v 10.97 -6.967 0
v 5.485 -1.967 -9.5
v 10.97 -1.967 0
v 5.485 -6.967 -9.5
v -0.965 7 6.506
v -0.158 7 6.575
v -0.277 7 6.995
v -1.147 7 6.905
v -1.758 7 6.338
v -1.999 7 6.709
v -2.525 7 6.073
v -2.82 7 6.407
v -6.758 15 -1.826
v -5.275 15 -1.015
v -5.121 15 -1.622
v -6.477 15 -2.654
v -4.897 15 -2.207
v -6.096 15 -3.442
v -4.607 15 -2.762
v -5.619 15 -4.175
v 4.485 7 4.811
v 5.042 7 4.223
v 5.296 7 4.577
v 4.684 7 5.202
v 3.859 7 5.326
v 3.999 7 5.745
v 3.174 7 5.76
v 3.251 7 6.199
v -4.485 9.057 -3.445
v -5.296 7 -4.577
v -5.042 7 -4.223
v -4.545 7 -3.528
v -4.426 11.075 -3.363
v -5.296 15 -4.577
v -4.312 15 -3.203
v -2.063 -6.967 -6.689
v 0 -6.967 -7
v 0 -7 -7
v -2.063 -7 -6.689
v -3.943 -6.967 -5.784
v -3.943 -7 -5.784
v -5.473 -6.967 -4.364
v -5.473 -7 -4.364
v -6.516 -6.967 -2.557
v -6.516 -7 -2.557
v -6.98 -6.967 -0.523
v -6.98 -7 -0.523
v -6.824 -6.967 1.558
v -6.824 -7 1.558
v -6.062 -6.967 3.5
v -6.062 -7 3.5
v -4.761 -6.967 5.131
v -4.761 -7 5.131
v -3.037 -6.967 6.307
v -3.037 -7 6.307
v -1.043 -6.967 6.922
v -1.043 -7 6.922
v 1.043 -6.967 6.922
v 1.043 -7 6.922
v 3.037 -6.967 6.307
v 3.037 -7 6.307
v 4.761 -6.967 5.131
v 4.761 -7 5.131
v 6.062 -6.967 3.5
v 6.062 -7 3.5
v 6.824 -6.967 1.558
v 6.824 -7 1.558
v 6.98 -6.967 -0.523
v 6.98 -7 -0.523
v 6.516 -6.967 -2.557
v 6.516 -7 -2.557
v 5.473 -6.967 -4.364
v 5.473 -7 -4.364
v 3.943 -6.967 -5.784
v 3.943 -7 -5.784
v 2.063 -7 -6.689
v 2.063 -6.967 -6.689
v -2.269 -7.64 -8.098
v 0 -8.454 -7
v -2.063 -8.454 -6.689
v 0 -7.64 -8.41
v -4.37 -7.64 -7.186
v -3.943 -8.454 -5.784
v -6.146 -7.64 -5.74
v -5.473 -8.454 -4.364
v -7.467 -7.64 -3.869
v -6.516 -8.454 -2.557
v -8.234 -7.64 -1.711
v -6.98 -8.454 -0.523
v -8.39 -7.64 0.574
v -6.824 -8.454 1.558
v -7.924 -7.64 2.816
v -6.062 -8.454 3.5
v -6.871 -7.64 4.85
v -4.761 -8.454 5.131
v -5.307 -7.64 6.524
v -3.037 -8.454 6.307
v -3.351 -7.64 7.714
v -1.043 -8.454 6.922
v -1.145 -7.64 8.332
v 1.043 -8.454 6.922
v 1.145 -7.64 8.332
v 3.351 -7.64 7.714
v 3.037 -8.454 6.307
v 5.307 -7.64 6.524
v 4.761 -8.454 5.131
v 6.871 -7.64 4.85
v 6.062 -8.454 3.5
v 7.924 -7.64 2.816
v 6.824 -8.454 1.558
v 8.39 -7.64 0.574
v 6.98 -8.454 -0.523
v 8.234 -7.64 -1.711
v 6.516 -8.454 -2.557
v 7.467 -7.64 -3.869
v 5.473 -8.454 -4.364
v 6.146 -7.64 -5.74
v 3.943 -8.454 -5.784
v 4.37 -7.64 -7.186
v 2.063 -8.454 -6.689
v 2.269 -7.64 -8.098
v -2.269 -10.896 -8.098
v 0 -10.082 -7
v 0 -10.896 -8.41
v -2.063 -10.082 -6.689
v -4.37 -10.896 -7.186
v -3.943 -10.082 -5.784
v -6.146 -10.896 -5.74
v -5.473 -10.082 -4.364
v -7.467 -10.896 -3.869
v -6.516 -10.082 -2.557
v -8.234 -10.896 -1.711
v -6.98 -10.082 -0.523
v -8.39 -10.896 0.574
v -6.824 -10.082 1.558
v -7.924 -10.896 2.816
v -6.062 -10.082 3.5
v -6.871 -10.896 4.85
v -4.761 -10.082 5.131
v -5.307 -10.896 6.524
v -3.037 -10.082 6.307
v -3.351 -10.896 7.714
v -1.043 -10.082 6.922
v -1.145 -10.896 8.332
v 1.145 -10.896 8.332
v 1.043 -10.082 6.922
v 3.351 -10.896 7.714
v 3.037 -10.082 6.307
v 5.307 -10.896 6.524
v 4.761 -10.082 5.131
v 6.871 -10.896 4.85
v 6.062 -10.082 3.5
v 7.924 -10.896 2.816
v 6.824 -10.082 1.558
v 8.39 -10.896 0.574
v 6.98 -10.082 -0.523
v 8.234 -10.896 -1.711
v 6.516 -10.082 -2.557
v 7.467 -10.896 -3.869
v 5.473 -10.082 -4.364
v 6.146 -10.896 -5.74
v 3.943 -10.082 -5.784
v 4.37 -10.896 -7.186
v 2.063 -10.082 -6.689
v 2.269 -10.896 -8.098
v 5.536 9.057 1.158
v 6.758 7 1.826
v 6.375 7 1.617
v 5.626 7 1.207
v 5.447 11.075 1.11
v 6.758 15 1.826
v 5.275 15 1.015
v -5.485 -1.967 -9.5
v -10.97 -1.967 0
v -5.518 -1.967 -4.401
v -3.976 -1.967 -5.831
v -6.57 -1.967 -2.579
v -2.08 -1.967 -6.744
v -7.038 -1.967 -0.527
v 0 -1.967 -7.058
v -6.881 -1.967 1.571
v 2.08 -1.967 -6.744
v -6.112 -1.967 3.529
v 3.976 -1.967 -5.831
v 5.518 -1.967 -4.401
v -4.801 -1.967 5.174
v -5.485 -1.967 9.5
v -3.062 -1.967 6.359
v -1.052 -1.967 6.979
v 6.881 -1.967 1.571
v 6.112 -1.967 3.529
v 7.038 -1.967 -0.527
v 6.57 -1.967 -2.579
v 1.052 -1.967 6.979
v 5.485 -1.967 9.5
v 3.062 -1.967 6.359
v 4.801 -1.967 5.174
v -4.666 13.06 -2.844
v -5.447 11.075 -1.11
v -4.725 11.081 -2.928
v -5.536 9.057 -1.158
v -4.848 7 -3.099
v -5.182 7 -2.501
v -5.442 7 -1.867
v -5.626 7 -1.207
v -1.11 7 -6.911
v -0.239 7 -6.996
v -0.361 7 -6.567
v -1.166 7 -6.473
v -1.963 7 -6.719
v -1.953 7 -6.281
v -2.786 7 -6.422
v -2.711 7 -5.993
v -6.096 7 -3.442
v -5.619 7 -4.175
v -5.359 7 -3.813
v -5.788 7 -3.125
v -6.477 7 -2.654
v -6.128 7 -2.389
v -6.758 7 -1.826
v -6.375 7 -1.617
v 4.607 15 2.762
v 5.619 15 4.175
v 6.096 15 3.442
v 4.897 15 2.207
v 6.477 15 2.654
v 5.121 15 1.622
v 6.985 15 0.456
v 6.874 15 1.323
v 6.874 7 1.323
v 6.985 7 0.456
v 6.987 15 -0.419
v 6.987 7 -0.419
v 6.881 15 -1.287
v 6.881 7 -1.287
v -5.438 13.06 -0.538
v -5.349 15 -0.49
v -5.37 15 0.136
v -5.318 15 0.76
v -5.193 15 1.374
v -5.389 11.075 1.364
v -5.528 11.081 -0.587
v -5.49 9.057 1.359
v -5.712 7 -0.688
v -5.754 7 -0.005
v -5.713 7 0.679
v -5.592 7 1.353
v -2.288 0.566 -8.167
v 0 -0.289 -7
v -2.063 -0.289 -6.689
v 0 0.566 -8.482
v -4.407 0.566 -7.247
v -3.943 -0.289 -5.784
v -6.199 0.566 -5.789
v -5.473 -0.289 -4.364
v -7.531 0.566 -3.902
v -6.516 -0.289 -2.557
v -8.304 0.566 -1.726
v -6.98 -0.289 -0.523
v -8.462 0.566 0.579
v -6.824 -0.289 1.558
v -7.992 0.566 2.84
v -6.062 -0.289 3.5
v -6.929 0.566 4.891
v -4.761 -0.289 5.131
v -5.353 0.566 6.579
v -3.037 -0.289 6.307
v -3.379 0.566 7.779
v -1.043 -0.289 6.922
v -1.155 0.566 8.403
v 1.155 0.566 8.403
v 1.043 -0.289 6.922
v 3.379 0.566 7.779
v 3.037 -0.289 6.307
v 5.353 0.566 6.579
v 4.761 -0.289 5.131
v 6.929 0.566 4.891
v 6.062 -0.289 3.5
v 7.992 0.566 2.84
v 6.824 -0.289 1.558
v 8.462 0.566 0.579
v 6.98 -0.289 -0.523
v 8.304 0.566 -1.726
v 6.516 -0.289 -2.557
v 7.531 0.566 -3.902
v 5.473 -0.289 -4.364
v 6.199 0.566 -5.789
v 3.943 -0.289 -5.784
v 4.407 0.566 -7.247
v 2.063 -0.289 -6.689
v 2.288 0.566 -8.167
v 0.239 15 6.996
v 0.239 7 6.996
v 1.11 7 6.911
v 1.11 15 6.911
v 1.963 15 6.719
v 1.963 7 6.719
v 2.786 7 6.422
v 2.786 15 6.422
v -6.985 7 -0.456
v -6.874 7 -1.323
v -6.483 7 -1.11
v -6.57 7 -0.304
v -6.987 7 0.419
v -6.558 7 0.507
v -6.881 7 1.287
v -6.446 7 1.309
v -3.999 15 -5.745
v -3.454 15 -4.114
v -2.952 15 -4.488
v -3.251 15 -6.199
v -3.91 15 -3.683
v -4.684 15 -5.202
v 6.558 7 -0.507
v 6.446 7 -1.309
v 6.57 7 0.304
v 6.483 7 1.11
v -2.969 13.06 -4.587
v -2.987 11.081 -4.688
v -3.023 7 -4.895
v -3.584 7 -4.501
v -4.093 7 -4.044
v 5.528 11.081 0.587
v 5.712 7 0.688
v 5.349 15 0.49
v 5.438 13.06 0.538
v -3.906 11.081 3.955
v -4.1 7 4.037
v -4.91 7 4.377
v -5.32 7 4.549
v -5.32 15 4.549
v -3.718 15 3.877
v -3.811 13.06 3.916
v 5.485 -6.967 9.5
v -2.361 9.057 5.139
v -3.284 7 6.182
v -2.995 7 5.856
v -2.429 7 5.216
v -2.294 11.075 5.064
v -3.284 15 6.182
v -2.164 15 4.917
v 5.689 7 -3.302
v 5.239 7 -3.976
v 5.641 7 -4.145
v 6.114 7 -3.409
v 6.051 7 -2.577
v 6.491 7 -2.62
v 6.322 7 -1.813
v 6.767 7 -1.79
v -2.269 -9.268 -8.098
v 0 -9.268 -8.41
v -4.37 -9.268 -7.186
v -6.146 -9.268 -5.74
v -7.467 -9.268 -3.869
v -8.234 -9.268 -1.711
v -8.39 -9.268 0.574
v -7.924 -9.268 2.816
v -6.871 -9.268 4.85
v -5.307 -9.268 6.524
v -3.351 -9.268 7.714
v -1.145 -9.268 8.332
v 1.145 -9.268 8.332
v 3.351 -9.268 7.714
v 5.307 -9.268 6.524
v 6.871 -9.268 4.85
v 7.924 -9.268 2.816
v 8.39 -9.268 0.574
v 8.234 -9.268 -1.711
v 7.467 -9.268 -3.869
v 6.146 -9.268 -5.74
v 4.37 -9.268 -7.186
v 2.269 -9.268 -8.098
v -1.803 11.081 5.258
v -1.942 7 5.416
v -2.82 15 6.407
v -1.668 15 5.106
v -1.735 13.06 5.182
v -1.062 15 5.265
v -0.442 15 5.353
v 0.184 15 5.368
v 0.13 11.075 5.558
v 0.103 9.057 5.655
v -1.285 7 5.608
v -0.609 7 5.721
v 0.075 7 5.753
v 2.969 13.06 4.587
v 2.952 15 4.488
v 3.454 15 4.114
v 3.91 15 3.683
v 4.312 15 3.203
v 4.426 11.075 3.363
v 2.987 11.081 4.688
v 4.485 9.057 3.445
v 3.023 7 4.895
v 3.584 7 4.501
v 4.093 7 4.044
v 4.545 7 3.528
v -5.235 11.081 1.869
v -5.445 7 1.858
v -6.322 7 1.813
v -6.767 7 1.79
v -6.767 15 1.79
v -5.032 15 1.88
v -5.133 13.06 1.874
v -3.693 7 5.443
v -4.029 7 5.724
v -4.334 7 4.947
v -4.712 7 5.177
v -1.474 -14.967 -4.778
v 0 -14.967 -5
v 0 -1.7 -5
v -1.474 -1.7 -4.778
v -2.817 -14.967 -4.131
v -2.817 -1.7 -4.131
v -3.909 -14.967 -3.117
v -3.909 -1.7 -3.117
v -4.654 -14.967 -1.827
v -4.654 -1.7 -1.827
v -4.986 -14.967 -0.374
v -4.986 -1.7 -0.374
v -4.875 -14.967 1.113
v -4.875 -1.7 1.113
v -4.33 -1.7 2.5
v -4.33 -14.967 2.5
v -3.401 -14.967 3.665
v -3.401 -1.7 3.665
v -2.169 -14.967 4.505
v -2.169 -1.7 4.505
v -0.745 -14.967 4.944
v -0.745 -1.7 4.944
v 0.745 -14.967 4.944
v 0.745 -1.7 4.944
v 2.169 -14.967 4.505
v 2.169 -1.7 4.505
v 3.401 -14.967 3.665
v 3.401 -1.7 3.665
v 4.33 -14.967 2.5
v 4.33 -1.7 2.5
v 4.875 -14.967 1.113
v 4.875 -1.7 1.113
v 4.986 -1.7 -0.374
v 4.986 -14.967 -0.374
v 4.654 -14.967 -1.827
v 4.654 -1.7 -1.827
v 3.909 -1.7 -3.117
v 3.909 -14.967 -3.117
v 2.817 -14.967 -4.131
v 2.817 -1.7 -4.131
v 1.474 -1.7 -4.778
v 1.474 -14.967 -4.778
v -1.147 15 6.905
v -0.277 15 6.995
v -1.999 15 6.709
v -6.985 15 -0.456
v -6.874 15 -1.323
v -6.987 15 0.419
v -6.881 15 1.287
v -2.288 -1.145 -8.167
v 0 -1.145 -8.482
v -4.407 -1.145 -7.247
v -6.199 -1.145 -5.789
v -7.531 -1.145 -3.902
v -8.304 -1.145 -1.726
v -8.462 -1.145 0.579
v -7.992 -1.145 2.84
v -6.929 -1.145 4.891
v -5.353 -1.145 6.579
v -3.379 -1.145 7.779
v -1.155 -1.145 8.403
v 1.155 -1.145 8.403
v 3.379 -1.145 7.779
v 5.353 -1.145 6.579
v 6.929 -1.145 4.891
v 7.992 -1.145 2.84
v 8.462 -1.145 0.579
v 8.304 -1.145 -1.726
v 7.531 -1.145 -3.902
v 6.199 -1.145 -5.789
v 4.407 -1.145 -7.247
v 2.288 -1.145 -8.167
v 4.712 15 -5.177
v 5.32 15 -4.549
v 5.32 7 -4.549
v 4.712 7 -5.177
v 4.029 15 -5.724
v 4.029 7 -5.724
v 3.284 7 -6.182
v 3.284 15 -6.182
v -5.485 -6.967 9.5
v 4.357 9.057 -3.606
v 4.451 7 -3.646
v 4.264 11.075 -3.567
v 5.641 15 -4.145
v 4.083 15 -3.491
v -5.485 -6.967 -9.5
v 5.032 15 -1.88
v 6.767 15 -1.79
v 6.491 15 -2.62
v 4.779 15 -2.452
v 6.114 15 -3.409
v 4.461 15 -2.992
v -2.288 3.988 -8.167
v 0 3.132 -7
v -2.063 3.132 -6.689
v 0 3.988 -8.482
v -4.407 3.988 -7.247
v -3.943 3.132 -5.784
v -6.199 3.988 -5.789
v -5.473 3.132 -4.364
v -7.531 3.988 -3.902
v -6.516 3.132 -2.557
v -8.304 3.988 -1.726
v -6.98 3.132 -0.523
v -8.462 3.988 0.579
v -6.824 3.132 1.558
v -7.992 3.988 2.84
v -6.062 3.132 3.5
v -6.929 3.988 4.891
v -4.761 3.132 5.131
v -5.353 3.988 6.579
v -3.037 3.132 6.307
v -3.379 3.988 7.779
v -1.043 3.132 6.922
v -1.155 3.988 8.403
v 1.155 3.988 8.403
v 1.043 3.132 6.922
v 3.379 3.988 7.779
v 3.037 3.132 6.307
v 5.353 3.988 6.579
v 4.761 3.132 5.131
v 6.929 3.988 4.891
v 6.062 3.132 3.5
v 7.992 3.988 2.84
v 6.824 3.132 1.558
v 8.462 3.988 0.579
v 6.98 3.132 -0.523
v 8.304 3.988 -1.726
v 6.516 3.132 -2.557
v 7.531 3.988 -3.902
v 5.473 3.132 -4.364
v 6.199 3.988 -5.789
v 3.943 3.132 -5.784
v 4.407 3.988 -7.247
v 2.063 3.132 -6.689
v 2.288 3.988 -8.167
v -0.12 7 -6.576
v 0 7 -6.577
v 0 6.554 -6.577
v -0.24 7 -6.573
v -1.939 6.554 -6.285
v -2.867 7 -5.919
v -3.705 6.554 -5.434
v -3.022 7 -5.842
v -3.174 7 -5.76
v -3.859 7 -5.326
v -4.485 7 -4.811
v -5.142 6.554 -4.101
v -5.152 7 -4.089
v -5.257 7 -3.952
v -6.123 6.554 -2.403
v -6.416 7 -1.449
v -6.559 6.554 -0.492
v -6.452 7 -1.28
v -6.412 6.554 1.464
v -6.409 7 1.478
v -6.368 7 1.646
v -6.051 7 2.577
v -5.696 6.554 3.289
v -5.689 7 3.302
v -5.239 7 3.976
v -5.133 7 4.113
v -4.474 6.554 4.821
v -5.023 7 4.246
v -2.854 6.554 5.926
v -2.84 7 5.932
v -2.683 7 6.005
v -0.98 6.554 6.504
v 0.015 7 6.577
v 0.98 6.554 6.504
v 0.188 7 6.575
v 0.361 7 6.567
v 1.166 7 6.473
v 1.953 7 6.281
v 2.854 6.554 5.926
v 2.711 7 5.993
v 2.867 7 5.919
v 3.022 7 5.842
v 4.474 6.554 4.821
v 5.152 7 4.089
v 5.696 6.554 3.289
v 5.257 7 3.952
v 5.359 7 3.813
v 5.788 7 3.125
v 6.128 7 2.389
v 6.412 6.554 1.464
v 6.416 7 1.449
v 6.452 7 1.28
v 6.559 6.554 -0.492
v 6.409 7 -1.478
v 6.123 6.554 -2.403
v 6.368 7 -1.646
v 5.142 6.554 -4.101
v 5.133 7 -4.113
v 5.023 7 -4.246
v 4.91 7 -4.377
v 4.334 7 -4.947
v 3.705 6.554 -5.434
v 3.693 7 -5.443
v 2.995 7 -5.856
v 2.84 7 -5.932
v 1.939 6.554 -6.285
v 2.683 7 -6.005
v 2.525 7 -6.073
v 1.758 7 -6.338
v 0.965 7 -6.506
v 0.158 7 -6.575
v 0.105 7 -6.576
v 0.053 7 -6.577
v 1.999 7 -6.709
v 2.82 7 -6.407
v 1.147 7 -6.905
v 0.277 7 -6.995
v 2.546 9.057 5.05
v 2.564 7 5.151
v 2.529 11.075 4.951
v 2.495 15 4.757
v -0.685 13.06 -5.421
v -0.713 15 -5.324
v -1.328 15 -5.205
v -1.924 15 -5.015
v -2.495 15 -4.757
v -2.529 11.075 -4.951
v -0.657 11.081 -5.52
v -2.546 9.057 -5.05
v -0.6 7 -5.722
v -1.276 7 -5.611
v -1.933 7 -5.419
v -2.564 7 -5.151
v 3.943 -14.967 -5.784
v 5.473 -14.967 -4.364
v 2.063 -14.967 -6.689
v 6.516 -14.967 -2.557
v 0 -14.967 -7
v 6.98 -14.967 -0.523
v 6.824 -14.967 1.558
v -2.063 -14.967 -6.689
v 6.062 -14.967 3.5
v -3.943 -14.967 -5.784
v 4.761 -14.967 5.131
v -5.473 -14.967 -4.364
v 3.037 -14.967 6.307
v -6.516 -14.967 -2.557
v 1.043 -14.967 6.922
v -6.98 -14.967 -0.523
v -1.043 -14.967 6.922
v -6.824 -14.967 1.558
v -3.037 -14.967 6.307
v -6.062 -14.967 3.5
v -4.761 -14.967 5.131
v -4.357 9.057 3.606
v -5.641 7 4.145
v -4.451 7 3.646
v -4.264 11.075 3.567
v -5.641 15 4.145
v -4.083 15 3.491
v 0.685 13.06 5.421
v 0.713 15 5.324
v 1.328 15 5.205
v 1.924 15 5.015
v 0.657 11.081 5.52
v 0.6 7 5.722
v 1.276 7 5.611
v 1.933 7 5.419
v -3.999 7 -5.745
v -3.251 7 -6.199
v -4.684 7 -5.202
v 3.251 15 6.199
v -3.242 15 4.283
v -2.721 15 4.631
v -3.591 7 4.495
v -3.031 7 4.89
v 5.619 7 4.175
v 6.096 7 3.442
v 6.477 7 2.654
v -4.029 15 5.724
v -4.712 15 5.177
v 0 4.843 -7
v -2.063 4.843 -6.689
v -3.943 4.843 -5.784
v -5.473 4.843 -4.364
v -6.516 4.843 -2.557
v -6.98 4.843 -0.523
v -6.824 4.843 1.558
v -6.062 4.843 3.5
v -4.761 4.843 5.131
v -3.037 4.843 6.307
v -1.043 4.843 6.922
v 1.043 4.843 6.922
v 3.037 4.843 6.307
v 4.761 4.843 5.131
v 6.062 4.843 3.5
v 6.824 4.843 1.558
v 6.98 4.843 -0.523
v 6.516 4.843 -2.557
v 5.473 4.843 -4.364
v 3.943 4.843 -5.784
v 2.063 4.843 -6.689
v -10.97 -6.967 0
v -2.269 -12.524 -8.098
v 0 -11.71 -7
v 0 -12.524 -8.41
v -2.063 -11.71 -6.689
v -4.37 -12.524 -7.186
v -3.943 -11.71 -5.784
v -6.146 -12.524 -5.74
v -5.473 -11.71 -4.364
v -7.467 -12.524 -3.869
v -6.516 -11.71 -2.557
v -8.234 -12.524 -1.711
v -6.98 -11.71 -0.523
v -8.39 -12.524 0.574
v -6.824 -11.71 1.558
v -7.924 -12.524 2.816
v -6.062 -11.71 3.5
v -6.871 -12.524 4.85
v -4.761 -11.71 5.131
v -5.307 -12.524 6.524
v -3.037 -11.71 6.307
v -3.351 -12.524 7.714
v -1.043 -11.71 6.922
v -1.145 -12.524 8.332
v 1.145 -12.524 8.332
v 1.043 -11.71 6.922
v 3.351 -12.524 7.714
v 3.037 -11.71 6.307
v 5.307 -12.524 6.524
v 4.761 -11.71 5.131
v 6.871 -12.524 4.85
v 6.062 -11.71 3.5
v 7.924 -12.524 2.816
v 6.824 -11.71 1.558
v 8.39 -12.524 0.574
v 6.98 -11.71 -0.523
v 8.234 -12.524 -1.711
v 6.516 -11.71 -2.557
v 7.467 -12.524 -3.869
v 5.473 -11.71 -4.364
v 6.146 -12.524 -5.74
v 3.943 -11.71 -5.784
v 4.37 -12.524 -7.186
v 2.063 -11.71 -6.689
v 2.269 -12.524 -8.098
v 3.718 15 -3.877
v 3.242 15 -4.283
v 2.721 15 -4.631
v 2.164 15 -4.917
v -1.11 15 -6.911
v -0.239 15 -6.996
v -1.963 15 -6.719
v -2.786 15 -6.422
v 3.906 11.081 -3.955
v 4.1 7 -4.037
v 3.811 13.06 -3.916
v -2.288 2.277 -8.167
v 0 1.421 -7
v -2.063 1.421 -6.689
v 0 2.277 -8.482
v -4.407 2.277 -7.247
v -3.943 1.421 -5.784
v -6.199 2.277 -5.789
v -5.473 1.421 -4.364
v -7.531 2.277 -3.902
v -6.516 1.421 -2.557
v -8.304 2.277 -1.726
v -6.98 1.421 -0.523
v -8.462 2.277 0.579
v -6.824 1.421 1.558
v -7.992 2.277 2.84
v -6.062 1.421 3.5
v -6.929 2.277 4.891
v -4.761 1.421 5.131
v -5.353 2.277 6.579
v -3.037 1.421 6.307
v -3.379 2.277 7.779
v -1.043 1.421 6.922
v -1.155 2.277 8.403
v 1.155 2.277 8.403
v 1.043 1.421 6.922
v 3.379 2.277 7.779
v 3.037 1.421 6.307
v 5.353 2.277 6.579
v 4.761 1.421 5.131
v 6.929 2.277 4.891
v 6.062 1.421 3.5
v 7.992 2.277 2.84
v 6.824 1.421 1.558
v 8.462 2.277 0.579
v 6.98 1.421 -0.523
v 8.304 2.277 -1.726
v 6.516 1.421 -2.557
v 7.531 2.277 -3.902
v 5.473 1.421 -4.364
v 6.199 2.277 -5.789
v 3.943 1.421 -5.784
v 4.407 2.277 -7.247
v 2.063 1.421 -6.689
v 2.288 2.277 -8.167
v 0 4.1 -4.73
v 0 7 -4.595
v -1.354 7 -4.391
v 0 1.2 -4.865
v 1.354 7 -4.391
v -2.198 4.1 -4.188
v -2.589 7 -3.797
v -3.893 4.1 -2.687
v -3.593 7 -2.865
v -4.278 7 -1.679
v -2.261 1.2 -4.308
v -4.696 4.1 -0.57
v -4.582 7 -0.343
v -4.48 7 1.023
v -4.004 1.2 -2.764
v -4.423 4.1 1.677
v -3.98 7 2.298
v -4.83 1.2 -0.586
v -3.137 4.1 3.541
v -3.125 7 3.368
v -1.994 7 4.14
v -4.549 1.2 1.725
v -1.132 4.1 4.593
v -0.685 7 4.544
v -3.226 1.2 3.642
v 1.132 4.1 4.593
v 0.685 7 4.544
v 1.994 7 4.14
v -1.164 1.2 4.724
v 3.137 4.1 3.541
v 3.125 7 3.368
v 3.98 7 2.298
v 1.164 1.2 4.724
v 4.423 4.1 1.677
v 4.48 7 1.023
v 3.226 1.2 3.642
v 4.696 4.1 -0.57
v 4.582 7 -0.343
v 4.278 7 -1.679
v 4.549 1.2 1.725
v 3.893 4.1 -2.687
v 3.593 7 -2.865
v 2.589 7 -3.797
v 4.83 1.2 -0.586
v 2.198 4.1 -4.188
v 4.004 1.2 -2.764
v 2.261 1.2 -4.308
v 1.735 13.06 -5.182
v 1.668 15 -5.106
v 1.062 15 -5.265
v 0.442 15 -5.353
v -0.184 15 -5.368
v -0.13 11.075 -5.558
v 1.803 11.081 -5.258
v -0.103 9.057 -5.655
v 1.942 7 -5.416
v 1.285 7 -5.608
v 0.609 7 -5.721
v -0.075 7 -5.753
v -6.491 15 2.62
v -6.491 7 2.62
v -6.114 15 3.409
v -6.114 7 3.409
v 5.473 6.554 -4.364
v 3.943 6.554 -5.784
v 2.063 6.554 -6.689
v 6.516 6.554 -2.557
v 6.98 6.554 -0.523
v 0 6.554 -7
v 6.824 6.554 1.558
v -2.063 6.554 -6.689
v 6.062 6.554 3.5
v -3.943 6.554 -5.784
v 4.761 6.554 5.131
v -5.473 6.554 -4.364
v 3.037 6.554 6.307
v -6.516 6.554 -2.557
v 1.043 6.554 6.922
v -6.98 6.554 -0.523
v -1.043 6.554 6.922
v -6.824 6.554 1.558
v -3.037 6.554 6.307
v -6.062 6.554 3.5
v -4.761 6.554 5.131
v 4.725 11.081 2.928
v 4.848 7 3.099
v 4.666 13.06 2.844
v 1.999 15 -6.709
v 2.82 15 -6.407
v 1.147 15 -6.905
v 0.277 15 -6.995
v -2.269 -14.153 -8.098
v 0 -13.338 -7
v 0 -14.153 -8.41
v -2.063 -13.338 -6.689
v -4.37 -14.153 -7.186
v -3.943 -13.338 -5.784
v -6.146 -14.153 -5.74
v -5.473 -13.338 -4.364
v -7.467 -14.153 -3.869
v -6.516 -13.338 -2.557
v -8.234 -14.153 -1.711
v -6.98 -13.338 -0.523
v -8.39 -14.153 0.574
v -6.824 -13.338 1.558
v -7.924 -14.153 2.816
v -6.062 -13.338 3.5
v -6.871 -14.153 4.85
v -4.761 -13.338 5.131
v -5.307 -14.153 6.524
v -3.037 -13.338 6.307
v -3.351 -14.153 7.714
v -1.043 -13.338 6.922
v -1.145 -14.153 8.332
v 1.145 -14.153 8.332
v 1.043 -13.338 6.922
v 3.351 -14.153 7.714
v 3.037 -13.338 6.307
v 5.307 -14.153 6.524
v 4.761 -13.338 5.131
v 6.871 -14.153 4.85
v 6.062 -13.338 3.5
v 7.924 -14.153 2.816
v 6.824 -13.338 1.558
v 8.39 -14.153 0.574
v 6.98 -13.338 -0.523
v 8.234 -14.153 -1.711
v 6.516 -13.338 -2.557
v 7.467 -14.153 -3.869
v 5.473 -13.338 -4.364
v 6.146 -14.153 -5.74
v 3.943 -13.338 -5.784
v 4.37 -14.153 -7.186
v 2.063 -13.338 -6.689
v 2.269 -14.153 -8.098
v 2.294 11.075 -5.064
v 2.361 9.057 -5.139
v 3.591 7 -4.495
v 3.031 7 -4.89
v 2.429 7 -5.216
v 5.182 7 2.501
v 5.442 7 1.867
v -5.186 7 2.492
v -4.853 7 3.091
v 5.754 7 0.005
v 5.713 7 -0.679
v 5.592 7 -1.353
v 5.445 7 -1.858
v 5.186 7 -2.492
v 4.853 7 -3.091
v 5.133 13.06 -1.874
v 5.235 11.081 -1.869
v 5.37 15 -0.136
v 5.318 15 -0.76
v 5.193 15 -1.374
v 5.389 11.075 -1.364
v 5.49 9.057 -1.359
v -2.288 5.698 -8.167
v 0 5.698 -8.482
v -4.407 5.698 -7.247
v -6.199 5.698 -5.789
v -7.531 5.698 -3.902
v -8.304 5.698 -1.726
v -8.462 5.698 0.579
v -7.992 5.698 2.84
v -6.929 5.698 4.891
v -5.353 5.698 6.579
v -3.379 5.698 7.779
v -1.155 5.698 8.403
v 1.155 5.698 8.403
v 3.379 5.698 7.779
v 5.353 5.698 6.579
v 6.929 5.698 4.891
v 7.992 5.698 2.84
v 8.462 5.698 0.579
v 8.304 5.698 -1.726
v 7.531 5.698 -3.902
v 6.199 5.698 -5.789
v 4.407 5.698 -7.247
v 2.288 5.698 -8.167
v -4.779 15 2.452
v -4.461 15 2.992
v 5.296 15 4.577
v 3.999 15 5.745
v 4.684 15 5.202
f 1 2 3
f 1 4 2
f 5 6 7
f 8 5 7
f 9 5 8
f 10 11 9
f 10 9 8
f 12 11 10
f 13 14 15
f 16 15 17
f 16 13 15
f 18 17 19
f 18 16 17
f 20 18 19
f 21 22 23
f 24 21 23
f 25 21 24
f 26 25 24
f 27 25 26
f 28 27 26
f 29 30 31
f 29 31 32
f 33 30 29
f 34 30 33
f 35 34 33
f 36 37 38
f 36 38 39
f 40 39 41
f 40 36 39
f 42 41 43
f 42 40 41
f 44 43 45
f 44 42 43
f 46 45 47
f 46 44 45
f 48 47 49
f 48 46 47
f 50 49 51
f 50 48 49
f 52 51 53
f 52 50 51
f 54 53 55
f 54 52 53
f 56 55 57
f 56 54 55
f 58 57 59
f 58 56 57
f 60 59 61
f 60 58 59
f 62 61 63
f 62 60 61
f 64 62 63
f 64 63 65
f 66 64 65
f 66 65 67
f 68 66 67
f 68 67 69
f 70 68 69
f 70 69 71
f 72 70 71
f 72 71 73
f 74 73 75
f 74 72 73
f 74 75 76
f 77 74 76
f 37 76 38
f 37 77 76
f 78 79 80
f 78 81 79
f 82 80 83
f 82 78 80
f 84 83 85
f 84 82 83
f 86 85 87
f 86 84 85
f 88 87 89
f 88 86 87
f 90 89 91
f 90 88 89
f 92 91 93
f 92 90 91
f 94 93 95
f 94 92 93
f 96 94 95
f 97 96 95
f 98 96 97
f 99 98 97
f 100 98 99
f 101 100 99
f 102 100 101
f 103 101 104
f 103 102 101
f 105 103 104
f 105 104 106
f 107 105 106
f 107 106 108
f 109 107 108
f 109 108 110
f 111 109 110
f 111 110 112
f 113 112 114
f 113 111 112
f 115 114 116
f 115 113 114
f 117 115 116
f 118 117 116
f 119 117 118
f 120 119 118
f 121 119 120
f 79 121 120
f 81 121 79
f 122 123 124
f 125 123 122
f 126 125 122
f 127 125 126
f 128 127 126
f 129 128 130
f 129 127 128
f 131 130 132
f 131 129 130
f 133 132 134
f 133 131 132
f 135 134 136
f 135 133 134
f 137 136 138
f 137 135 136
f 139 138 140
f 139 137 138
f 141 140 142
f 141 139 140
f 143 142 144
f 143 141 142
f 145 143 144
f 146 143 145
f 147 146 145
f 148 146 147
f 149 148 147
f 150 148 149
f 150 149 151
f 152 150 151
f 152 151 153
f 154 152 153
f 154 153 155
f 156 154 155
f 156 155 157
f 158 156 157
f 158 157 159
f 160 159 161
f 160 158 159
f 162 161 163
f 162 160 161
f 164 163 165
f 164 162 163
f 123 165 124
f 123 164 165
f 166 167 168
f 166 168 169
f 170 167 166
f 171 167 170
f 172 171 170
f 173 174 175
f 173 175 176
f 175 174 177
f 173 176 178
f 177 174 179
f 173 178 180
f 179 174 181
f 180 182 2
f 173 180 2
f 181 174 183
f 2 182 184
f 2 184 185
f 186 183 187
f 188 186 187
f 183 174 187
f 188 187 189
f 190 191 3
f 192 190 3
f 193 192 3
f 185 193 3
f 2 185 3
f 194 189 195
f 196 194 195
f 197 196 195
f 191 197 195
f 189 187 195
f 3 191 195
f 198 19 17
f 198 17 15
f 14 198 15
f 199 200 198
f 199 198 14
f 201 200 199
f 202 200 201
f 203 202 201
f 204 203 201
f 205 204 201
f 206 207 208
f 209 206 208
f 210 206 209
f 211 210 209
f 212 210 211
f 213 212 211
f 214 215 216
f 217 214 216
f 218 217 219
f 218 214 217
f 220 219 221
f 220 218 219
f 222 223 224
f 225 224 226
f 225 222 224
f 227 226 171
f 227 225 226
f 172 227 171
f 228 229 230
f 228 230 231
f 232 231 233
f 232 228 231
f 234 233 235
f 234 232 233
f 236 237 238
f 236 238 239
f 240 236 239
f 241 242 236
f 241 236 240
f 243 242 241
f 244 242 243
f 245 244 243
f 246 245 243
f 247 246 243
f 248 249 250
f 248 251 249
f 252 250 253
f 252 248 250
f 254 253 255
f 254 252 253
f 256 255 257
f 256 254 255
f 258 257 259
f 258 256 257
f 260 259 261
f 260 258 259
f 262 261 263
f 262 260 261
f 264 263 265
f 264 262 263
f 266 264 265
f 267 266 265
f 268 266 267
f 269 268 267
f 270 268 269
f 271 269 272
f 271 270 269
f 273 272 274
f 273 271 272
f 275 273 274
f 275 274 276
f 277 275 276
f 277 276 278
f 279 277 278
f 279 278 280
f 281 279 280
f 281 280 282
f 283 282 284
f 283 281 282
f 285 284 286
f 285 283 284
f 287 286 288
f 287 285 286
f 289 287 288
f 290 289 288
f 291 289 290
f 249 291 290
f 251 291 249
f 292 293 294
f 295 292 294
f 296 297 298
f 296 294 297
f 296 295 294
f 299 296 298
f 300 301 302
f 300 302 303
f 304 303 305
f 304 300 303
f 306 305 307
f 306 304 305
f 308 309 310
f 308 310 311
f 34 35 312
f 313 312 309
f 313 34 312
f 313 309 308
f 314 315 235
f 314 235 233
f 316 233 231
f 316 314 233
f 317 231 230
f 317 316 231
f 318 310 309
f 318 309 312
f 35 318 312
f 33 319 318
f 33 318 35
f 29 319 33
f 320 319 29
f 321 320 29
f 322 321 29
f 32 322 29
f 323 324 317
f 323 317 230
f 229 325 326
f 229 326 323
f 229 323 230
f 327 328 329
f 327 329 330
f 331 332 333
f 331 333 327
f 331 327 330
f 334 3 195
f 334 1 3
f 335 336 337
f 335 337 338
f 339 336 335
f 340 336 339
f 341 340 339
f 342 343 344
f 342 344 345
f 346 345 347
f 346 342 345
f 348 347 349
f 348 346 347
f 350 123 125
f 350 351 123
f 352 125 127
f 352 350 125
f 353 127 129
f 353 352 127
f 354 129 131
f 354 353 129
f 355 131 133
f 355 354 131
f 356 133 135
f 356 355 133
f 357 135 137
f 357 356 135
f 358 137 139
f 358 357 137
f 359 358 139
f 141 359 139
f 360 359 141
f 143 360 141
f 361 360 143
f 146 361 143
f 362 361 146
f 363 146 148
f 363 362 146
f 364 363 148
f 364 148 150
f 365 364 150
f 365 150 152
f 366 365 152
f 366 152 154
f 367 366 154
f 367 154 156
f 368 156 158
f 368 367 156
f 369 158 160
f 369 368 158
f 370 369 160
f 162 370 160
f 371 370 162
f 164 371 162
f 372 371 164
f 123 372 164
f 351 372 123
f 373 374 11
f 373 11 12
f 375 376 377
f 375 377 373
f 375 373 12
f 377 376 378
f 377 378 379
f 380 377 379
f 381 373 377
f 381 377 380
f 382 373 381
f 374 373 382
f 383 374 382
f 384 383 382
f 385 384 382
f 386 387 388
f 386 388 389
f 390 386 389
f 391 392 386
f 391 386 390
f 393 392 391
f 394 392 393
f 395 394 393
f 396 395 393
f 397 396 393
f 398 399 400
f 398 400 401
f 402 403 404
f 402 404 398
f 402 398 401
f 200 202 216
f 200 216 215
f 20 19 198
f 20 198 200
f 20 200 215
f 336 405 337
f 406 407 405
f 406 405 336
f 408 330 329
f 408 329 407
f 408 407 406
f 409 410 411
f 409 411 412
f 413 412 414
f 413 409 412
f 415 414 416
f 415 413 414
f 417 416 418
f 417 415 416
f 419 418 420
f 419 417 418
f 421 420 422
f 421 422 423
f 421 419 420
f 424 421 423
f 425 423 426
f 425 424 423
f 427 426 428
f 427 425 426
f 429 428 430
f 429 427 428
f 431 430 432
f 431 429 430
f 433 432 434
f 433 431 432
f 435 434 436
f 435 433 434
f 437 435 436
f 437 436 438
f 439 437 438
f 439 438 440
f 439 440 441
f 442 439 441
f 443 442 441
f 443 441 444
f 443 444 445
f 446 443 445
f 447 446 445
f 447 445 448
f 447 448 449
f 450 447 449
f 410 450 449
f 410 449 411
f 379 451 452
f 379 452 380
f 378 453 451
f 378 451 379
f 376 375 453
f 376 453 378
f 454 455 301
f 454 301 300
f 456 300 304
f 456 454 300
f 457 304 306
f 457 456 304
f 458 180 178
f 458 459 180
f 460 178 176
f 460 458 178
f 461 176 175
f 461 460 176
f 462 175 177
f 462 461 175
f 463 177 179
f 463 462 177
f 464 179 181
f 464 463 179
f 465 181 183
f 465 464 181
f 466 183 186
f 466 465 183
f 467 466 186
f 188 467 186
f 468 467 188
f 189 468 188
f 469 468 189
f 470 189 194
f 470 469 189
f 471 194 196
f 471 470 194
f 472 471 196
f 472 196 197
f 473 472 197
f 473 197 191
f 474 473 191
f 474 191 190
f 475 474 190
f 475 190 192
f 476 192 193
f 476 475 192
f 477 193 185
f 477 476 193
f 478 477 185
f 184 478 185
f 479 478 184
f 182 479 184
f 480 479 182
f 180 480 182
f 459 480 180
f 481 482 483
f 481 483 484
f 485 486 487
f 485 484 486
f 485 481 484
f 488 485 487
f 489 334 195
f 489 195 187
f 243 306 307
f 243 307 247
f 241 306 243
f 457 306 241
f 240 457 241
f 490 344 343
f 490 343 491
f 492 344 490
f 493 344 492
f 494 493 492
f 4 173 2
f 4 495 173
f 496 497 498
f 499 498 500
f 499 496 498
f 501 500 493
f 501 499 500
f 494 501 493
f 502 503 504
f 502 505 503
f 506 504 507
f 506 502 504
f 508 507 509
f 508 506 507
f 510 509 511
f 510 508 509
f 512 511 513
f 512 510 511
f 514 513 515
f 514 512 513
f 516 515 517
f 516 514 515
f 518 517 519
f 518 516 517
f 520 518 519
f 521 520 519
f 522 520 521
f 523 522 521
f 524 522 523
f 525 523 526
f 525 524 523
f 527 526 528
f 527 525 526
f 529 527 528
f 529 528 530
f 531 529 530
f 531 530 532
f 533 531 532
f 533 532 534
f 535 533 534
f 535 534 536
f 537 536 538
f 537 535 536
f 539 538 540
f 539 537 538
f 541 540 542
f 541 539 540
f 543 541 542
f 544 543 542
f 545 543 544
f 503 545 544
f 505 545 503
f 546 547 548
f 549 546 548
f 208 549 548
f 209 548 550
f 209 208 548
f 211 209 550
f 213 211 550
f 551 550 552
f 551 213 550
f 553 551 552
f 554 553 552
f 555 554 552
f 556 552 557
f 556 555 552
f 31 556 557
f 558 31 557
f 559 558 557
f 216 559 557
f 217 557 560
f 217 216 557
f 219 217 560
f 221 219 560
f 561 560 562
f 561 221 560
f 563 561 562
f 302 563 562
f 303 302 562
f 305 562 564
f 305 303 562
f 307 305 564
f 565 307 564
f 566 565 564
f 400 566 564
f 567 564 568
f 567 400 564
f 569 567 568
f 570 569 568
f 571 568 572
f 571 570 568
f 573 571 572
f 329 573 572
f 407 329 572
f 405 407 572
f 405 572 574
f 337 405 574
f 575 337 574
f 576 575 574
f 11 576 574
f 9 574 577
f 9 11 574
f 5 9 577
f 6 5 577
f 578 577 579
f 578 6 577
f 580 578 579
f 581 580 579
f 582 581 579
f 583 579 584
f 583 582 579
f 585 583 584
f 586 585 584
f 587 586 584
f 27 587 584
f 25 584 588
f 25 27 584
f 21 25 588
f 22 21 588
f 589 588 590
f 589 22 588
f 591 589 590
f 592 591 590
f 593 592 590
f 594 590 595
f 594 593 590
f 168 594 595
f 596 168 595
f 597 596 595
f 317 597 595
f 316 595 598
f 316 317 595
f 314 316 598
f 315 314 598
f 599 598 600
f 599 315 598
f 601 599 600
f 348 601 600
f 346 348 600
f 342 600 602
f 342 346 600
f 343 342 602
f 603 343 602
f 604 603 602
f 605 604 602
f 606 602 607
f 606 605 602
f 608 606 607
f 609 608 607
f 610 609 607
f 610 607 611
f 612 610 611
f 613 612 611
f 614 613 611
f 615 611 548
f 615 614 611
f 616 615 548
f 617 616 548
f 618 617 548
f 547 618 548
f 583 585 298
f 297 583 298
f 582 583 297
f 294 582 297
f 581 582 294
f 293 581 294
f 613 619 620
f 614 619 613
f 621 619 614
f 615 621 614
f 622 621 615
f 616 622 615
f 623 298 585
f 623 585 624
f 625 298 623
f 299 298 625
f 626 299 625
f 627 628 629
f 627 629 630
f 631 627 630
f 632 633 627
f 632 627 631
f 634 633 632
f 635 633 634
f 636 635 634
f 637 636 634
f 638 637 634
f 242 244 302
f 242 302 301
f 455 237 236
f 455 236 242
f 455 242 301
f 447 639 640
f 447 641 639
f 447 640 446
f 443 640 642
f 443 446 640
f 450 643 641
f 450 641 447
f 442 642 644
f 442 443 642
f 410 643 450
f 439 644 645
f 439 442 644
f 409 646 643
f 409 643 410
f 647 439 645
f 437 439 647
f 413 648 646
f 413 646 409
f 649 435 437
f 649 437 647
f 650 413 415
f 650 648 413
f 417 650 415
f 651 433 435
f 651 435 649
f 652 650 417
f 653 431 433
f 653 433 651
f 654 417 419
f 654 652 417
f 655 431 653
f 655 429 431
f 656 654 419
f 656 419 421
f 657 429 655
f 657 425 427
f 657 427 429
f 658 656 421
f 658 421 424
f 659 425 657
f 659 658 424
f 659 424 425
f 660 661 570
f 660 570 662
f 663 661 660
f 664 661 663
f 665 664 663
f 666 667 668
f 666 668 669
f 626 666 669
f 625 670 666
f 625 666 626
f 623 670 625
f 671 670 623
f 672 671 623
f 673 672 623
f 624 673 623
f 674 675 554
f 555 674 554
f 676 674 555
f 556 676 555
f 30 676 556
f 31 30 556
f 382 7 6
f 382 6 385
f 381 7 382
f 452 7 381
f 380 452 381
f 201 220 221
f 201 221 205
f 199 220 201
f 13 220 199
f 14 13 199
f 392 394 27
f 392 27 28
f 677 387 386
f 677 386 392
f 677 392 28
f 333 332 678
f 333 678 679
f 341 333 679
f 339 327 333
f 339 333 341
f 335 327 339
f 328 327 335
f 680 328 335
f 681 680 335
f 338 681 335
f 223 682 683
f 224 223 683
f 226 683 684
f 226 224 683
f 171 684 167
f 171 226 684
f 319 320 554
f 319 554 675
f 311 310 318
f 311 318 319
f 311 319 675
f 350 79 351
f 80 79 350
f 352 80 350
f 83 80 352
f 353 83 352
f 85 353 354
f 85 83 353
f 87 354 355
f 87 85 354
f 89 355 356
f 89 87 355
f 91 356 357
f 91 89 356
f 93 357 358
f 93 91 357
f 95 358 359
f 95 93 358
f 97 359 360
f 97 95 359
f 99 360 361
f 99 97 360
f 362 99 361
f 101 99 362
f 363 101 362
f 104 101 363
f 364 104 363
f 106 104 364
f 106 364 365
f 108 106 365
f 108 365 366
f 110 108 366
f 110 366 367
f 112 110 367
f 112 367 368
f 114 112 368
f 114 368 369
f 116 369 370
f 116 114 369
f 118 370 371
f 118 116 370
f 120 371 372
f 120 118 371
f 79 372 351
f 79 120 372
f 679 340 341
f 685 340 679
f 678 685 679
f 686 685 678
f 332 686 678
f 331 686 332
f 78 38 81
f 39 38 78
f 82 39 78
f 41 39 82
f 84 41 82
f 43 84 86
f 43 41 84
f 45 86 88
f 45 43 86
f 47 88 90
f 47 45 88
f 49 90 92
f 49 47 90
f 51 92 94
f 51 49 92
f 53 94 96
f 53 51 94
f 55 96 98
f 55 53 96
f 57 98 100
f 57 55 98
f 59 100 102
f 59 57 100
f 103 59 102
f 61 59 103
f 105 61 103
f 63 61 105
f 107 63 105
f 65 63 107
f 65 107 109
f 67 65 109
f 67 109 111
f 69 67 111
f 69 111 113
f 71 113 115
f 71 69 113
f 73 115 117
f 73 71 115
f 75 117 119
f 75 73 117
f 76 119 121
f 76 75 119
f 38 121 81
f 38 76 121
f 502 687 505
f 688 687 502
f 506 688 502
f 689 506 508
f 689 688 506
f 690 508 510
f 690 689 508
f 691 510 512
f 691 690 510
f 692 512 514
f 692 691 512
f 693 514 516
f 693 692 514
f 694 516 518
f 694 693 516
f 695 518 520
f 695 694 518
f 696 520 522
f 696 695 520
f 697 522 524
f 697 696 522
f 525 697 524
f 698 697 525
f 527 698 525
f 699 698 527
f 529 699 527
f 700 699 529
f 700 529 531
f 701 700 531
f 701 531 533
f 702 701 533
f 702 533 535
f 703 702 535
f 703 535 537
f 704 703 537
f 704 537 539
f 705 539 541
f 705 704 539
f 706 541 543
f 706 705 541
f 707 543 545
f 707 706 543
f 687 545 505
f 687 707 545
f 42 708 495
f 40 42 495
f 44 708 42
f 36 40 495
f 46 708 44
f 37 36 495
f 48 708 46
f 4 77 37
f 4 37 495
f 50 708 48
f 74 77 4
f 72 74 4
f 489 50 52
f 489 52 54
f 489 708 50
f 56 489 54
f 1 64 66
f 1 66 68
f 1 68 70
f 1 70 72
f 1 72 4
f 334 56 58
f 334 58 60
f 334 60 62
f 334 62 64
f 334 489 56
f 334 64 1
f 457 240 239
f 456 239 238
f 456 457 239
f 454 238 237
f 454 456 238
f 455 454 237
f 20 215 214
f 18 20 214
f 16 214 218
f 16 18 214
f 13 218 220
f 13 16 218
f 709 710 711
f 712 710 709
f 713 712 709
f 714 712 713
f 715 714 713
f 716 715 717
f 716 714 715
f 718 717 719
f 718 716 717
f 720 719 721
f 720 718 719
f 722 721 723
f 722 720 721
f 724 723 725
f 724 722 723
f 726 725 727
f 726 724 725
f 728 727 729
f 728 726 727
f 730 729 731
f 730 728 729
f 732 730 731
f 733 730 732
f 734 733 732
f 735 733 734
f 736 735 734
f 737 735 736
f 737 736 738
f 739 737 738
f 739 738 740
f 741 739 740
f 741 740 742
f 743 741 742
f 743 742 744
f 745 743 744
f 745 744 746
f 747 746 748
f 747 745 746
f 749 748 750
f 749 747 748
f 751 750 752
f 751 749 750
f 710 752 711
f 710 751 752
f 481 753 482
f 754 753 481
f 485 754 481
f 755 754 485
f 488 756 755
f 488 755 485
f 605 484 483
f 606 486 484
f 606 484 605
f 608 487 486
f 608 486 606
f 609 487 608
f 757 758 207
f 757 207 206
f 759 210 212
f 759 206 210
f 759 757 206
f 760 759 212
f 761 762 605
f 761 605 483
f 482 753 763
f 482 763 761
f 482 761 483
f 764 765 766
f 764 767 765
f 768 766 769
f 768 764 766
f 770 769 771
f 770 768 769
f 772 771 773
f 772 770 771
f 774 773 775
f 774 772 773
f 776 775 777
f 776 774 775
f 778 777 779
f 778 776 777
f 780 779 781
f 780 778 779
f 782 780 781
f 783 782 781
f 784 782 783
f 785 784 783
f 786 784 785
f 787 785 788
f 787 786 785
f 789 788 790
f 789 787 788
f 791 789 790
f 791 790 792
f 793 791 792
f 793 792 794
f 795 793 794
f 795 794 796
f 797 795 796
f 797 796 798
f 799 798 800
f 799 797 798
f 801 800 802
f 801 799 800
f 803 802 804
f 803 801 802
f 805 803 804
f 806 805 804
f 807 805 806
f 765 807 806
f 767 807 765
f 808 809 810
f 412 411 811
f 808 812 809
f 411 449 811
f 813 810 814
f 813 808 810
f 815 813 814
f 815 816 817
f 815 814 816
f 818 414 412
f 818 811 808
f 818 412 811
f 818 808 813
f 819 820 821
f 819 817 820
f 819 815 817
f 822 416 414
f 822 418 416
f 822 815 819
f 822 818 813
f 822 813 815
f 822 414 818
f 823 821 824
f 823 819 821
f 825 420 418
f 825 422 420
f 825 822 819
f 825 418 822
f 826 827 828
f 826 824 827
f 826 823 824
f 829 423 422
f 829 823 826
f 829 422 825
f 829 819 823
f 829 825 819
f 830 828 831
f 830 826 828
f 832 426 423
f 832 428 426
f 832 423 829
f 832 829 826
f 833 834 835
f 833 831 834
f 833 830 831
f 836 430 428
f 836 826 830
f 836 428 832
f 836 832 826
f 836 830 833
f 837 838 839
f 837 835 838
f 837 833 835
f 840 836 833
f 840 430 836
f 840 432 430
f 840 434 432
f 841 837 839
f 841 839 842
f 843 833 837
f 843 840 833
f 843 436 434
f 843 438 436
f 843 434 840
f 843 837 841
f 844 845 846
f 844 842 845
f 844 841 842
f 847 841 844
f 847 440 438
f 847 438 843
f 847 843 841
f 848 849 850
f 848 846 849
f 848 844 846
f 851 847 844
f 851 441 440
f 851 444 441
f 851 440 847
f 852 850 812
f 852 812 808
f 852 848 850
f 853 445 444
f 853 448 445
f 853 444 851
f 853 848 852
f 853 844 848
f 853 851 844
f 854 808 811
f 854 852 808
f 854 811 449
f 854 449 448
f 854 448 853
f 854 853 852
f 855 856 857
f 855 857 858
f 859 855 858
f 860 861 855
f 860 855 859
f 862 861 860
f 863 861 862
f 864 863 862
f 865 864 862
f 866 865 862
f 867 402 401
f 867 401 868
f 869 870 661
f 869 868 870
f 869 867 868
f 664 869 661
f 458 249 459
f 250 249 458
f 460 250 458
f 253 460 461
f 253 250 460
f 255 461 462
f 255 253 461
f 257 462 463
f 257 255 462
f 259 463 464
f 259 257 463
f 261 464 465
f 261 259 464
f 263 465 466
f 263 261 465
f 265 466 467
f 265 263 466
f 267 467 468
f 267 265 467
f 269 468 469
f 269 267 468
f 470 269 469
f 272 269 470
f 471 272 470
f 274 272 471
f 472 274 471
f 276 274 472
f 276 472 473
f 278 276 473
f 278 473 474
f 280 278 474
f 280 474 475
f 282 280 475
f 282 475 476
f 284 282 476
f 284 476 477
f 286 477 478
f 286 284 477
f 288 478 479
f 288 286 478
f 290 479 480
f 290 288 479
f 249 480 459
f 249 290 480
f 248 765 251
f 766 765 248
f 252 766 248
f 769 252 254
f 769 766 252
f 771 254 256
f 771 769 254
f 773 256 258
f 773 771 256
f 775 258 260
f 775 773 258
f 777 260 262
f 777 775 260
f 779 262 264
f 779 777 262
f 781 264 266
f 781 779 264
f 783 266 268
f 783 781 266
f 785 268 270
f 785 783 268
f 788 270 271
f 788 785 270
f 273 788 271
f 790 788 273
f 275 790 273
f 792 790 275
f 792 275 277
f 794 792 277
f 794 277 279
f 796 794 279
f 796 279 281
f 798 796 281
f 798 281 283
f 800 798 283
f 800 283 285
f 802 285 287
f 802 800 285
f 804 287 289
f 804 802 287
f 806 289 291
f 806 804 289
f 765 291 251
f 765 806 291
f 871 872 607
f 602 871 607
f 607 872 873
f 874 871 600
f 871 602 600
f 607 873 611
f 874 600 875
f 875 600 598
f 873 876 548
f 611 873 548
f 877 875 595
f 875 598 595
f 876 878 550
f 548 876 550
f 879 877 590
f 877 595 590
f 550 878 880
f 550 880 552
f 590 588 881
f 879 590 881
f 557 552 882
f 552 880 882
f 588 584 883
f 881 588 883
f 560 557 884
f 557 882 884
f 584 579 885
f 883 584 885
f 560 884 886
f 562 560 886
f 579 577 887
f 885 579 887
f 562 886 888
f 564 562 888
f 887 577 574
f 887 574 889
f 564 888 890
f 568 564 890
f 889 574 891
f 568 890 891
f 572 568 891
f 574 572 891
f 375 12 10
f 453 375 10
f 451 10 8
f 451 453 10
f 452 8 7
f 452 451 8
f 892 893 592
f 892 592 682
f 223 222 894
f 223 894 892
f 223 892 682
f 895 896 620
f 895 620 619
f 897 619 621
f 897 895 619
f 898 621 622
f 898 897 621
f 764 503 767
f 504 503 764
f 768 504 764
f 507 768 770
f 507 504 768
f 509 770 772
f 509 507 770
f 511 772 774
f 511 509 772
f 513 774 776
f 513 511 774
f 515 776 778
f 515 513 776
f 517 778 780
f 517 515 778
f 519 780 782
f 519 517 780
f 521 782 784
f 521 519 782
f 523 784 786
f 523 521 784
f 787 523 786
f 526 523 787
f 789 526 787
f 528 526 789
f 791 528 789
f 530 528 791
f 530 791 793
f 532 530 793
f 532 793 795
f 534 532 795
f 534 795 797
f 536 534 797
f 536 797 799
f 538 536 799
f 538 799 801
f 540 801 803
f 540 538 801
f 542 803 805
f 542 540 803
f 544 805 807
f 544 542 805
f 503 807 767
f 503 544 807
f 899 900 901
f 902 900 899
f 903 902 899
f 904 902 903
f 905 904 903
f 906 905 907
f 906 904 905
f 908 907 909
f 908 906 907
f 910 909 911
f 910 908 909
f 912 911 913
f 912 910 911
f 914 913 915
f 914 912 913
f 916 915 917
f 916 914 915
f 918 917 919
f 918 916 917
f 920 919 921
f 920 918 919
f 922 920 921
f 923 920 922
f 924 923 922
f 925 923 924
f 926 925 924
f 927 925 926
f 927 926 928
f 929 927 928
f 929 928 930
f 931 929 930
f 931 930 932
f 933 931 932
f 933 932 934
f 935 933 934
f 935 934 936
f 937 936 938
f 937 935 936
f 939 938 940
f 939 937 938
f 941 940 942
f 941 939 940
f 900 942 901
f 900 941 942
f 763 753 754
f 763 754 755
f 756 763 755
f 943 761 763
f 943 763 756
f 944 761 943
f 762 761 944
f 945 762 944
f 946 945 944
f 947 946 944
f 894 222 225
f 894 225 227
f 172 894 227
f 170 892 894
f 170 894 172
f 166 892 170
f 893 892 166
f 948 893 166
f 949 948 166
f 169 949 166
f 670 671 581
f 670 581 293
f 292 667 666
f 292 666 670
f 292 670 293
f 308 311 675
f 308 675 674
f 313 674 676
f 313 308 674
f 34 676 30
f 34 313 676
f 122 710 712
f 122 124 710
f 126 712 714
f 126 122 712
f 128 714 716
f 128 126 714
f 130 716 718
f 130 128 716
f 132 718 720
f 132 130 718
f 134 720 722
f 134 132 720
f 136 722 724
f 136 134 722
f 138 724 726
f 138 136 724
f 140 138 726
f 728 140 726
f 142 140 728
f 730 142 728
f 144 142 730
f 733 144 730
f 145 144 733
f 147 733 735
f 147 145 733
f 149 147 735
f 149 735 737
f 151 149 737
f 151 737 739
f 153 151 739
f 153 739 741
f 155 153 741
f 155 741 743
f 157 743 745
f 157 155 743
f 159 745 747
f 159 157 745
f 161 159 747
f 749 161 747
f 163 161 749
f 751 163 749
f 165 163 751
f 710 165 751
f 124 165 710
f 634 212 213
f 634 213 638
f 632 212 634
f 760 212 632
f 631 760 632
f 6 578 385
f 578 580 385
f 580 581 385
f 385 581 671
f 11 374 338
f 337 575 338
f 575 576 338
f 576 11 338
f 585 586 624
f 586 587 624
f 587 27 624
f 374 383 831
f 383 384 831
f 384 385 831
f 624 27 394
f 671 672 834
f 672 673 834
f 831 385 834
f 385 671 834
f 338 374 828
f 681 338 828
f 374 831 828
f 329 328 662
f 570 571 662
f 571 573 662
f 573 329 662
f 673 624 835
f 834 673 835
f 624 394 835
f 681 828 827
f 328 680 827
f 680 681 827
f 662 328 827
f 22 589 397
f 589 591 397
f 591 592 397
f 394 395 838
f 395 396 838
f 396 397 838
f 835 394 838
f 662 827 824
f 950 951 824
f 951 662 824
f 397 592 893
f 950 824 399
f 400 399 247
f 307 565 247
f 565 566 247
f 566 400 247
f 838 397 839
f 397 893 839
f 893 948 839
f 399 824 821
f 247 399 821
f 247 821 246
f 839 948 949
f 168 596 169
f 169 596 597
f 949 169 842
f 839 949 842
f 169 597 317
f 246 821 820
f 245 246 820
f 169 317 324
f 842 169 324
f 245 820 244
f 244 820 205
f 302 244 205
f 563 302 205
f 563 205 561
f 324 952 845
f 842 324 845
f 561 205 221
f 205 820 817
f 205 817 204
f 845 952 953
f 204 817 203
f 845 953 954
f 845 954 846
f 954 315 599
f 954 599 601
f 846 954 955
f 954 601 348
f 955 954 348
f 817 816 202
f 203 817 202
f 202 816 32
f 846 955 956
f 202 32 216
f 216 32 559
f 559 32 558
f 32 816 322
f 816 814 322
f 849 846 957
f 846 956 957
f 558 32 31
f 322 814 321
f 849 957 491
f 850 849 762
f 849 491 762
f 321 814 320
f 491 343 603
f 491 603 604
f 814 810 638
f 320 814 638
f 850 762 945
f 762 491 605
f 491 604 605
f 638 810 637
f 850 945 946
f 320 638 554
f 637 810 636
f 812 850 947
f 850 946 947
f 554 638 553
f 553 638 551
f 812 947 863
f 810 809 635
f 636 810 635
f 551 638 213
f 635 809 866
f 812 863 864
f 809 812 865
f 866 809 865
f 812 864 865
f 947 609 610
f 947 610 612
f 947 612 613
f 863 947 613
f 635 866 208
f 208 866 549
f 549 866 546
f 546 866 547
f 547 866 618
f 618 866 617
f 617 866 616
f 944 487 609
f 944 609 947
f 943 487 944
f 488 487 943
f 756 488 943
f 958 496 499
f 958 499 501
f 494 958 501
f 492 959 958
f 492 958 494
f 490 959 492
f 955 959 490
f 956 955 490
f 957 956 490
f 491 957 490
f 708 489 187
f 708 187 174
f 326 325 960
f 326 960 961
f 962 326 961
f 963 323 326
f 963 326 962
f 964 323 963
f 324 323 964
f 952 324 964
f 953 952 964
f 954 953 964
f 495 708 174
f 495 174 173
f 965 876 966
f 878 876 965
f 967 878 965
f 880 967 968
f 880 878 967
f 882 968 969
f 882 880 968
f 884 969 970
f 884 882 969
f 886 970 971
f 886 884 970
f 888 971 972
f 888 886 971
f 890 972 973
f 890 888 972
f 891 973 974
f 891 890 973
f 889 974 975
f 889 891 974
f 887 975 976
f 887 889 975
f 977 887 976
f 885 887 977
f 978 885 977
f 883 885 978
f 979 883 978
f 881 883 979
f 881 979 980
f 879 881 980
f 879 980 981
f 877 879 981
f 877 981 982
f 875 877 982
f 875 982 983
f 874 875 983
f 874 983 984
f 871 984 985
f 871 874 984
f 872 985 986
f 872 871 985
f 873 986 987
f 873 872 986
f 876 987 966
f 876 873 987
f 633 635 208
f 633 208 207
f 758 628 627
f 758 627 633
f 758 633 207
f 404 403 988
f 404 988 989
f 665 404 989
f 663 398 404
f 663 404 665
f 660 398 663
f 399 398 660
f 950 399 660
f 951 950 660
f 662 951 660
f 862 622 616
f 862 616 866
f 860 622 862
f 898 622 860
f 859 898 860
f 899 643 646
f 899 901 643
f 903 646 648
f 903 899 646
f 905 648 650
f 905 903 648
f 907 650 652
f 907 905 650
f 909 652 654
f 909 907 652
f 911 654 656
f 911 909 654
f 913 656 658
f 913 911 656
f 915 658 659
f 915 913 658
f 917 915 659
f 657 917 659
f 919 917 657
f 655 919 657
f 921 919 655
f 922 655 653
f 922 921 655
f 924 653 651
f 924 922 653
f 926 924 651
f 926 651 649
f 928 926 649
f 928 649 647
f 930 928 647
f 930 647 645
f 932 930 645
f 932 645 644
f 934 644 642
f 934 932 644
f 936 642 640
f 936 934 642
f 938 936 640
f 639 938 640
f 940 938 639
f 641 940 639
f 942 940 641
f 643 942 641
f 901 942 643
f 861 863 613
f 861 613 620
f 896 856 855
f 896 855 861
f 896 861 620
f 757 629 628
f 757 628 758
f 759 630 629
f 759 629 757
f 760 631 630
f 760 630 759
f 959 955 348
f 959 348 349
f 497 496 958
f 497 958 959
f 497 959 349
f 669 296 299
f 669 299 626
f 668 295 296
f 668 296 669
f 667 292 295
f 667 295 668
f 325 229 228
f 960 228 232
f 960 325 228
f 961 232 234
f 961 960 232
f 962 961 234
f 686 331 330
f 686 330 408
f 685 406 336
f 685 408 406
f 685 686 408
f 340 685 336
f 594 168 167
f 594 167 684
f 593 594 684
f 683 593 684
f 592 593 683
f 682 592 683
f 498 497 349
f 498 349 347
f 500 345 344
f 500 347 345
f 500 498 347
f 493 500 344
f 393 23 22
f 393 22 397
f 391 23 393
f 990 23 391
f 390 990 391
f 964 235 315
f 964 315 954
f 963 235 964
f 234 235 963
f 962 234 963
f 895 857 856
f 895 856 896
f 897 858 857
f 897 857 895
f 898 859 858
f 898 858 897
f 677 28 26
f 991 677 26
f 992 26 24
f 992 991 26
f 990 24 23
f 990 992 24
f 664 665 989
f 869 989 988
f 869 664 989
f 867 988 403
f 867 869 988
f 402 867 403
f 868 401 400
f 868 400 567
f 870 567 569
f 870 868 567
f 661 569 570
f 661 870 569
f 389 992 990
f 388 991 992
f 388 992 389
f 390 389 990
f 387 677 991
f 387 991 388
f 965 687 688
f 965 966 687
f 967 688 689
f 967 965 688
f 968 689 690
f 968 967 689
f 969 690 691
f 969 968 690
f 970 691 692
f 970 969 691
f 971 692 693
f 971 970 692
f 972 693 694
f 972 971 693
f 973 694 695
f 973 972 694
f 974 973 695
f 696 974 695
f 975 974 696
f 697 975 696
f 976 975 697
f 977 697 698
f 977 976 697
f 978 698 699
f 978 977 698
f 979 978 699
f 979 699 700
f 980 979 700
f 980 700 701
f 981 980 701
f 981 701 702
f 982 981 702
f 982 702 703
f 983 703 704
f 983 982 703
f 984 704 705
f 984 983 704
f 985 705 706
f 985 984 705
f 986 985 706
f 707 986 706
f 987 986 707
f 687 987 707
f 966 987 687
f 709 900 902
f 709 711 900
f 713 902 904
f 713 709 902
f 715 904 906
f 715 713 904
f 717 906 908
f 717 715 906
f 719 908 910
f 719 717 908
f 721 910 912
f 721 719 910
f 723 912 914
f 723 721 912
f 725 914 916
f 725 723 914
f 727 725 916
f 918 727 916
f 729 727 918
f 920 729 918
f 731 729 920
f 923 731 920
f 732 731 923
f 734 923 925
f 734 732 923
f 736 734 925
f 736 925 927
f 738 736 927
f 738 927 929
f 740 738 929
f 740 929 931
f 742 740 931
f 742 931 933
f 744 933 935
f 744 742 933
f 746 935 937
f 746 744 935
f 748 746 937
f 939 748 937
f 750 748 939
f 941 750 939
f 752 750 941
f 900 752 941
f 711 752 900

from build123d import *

# Parameters (mm, degrees)
BOSS_EXTRUDE1_DEPTH = 2.5
CUT_EXTRUDE1_DEPTH  = 8
CIRPATTERN1_COUNT   = 14
CUT_EXTRUDE2_START  = -10
SKETCH5_R           = 5
CUT_EXTRUDE2_DEPTH  = 10


with BuildPart() as part:
    # Sketch1 → Revolve1 (revolve)
    with BuildSketch(Plane.XY, mode=Mode.PRIVATE) as revolve1_sk:
        Polygon((-5, -1.7), (-5, -14.966593737), (-7, -14.966593737), (-8.41, -14.152529857), (-7, -13.338465977), (-8.41, -12.524402098), (-7, -11.710338218), (-8.41, -10.896274339), (-7, -10.082210459), (-8.41, -9.26814658), (-7, -8.4540827), (-8.41, -7.640018821), (-7, -7), (-7, -2), (-8.481548045, -1.144627838), (-7, -0.289255675), (-8.481548045, 0.566116487), (-7, 1.42148865), (-8.481548045, 2.276860812), (-7, 3.132232974), (-8.481548045, 3.987605137), (-7, 4.842977299), (-8.481548045, 5.698349462), (-7, 6.553721624), (-6.800767408, 6.553721624), (-6.577224477, 6.553721624), (-6.577224477, 7), (-7, 7), (-7, 15), (-5.371576334, 15), (-5.753711326, 7), (-5.371576334, 7), (-4.595145819, 7), align=None)
    revolve(revolve1_sk.sketch.rotate(Axis((0, -16.464923423, 0), (0, 1, 0)), 270), axis=Axis((0, -16.464923423, 0), (0, 1, 0)))

    # Sketch2 → Boss-Extrude1 (add, symmetric)
    with BuildSketch(Plane.XZ.offset(4.466593737)):
        Polygon((10.969655115, 0), (5.484827557, 9.5), (-5.484827557, 9.5), (-10.969655115, 0), (-5.484827557, -9.5), (5.484827557, -9.5), align=None)
    extrude(amount=BOSS_EXTRUDE1_DEPTH, both=True)

    # Sketch4 → Cut-Extrude1 (cut)
    with BuildSketch(Plane(origin=(0, 15, 0), x_dir=(1, 0, 0), z_dir=(0, 1, 0))):
        Polygon((-8.353753696, 8.845150972), (-2.200605193, 0.256381188), (-2.627907173, 0), (-8.80128537, 8.617007067), align=None)
    cut_extrude1 = extrude(amount=-CUT_EXTRUDE1_DEPTH, mode=Mode.SUBTRACT)

    # CirPattern1: Cut-Extrude1 ×14 about axis
    cirpattern1_axis = Axis((0, 0, 0), (0, 1, 0))
    for i in range(1, CIRPATTERN1_COUNT):
        add(cut_extrude1.rotate(cirpattern1_axis, i * 360 / CIRPATTERN1_COUNT), mode=Mode.SUBTRACT)

    # Sketch5 → Cut-Extrude2 (cut)
    with BuildSketch(Plane(origin=(0, -1.966593737, 0), x_dir=(1, 0, 0), z_dir=(0, 1, 0)).offset(CUT_EXTRUDE2_START)):
        with Locations(Location((0, 0, 0), (0, 0, 90))):
            Circle(SKETCH5_R)
    extrude(amount=CUT_EXTRUDE2_DEPTH, mode=Mode.SUBTRACT)


solid = part.part
